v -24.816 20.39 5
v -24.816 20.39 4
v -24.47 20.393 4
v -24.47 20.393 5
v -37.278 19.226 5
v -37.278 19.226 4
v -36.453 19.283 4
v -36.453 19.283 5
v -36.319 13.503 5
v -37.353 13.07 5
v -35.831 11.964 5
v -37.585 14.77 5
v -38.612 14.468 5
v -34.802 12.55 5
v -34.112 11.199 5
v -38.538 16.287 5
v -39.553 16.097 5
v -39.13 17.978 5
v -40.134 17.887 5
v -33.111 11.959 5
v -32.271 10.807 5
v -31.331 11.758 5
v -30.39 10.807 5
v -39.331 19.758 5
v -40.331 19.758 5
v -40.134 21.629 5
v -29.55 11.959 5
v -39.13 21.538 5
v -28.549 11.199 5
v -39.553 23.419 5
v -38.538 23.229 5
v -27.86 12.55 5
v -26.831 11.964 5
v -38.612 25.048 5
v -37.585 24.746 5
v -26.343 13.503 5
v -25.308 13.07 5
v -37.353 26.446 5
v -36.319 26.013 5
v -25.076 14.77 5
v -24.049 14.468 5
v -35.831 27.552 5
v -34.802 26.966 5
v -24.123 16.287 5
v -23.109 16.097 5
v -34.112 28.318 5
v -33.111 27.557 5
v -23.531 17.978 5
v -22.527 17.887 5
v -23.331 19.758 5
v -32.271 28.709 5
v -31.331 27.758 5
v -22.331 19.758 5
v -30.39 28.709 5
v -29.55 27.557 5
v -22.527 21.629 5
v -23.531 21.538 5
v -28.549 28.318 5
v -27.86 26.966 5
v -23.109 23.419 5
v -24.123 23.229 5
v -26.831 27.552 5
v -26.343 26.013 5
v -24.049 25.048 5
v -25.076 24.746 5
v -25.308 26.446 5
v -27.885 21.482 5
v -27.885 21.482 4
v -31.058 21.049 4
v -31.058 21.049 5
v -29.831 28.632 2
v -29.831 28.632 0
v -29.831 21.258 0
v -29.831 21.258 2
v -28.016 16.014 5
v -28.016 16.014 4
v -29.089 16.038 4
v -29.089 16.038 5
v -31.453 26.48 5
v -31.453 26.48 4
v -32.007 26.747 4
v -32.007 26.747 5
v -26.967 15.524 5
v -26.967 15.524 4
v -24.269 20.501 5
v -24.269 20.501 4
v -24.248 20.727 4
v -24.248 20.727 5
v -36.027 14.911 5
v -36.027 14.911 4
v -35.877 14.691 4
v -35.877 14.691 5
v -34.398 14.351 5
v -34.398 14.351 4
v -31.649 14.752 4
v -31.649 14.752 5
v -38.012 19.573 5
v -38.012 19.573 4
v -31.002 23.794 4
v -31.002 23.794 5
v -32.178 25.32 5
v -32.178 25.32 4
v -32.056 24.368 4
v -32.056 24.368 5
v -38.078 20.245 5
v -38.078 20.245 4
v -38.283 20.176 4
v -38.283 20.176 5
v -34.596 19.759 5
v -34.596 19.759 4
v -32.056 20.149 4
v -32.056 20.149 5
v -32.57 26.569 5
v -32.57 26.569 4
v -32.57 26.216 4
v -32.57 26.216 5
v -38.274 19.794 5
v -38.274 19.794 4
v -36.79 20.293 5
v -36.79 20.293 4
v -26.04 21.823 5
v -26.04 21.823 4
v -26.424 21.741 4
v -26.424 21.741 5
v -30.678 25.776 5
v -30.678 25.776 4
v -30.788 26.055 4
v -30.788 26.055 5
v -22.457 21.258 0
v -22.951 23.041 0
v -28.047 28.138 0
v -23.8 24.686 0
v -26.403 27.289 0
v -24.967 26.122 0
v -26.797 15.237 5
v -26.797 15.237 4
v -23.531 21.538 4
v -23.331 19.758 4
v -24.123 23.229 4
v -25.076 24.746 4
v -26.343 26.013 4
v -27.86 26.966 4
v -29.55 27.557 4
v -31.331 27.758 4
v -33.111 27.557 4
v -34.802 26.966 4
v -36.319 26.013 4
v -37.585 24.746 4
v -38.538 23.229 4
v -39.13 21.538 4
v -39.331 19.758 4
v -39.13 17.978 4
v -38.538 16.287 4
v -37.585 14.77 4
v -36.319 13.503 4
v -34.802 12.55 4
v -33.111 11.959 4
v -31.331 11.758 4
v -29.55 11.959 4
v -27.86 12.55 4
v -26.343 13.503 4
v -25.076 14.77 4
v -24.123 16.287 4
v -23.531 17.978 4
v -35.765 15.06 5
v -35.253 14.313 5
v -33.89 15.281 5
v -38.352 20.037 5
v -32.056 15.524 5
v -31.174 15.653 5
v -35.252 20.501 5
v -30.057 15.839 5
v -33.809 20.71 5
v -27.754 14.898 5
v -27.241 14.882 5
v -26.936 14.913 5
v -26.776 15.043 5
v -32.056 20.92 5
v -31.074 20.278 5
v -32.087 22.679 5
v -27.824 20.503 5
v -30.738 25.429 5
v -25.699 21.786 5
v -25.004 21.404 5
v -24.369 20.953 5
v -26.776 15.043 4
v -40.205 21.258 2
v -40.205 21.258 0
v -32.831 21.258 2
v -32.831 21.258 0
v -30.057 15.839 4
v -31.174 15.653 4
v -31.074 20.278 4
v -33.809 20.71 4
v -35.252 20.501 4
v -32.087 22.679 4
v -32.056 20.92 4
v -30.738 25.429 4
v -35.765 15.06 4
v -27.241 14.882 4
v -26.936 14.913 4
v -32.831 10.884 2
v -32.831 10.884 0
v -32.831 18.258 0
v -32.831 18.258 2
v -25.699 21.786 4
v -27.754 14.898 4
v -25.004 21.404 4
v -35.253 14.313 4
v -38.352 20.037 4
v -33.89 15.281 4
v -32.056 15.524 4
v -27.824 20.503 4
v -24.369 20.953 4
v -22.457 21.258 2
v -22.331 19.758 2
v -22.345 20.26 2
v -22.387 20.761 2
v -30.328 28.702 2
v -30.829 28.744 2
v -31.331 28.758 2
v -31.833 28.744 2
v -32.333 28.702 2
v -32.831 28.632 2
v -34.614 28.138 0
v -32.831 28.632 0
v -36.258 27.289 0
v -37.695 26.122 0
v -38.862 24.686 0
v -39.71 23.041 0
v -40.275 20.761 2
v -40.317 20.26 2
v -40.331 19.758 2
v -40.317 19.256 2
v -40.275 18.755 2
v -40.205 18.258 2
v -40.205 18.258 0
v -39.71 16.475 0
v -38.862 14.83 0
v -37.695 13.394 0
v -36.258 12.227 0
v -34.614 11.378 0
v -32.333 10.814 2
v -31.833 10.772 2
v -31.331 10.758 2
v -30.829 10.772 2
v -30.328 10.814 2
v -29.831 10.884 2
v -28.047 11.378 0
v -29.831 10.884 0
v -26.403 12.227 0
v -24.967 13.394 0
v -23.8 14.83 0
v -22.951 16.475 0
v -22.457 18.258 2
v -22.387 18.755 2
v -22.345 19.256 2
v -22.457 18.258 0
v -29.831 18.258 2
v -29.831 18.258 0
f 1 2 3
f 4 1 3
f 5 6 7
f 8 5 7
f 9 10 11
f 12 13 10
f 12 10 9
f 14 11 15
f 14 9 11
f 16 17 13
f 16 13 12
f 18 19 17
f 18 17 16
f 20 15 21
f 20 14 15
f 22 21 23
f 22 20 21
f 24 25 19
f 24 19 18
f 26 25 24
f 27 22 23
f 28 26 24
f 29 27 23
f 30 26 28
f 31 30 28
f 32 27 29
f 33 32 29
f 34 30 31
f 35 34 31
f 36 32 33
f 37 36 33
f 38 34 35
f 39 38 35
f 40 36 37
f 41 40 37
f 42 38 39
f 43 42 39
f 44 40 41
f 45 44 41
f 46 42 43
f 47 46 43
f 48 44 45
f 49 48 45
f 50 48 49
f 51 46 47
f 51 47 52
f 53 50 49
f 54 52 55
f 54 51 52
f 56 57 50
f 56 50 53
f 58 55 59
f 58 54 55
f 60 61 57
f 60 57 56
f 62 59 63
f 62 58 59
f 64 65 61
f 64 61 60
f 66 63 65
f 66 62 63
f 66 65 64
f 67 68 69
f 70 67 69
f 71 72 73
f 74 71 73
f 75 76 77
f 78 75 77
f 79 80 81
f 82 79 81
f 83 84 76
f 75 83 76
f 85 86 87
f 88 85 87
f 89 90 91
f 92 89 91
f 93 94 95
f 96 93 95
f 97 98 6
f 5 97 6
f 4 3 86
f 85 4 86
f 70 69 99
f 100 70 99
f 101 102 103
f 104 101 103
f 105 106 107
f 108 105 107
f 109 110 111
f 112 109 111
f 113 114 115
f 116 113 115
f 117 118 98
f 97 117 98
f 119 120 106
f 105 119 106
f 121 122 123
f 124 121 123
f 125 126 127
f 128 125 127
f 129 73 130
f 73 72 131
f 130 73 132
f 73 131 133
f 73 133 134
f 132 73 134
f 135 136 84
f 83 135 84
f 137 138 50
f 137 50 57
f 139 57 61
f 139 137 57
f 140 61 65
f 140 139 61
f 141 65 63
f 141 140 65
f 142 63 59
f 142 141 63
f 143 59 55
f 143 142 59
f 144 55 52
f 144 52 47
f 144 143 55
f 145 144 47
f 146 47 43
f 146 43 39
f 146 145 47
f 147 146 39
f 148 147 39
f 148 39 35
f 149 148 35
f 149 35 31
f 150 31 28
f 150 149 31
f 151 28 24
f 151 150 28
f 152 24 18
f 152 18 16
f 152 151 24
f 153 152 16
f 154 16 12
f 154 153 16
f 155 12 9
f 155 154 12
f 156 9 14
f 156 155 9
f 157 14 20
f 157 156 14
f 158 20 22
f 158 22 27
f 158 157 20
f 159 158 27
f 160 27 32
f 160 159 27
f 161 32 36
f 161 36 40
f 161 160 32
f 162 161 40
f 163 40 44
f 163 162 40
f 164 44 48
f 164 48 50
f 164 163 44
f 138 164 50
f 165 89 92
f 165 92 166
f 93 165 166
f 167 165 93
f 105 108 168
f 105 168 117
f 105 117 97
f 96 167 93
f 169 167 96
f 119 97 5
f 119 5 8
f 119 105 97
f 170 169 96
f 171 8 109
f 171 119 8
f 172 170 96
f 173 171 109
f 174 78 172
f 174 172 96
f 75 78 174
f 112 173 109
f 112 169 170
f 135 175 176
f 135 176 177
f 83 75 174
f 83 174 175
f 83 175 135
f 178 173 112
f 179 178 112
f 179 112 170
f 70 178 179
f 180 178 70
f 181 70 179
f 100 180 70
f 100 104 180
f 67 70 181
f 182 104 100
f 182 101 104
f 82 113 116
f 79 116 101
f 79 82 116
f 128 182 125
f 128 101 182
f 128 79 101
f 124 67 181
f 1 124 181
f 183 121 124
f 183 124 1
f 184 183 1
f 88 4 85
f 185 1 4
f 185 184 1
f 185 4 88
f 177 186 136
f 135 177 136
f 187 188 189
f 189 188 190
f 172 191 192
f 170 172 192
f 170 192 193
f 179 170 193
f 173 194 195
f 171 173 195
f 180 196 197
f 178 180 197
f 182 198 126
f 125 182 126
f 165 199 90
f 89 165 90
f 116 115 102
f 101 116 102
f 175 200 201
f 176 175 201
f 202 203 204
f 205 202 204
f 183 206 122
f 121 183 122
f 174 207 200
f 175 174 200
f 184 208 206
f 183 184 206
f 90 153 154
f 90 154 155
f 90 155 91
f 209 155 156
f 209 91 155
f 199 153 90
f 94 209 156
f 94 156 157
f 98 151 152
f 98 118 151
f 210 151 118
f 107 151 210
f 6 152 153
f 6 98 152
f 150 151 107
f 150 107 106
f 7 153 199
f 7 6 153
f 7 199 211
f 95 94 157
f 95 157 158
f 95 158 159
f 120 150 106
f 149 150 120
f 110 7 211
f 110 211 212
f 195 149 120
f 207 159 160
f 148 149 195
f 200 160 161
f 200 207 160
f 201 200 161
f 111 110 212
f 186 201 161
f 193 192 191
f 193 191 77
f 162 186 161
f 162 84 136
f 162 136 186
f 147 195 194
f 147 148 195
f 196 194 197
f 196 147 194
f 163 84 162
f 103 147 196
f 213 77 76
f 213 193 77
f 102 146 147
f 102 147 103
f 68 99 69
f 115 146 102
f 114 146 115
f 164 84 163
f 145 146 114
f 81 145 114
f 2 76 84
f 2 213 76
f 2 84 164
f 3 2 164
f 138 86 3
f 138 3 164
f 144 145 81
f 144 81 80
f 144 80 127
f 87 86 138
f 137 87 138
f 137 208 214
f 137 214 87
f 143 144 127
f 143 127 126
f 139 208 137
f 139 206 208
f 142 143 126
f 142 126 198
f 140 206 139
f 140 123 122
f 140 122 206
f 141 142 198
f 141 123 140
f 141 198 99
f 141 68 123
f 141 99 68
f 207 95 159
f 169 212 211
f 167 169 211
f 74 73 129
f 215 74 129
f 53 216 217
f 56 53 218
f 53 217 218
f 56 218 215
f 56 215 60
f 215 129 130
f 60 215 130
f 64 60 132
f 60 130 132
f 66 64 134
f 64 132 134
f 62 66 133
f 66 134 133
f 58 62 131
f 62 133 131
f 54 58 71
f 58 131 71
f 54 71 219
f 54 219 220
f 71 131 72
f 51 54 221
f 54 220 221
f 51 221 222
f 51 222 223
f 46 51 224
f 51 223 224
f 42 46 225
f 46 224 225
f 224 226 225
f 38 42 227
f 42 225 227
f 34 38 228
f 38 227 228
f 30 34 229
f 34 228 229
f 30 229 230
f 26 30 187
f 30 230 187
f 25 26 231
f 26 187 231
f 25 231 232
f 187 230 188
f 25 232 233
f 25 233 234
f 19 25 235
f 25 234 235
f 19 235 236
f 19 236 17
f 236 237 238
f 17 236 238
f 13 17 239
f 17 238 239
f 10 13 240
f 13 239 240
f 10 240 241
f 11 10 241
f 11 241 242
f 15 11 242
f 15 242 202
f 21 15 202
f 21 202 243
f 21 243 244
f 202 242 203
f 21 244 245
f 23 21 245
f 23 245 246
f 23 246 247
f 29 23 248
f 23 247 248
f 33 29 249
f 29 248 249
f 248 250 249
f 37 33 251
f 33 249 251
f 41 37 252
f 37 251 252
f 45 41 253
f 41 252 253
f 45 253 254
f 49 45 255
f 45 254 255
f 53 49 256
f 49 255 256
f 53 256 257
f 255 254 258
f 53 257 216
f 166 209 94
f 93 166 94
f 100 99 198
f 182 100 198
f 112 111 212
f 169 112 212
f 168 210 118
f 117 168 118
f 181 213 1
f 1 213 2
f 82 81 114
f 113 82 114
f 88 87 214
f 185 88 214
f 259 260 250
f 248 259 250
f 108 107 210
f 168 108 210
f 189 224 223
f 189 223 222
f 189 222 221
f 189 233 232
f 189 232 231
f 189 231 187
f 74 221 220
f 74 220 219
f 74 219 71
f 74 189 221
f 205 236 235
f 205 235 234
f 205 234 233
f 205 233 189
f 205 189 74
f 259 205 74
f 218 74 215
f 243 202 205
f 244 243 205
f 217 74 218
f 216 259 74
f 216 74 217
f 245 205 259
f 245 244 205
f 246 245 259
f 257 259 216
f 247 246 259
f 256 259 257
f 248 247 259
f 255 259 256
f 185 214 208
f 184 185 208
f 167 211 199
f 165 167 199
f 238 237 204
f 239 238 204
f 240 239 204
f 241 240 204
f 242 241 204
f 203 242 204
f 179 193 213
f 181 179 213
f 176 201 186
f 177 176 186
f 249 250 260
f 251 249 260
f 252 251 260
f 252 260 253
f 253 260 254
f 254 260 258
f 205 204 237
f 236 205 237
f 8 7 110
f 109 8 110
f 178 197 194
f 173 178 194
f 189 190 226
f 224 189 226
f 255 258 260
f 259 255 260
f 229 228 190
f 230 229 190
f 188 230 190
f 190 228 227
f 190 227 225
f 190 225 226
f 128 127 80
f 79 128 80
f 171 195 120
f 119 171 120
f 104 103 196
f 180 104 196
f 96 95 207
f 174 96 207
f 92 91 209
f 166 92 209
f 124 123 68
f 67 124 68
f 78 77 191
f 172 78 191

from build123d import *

# Parameters (mm, degrees)
F0_R     = 9
F1_DEPTH = 4
F3_W     = 3
F3_H     = 3
F4_DEPTH = 2
F2_R     = 9
F2_R_2   = 8
F5_DEPTH = 1
F7_DEPTH = 1


# Not quite as in the source:
# - a feature names something its author has since deleted; it is built from what else it names


with BuildPart() as f1:
    # F0 (on Top) → F1 (new body)
    with BuildSketch(Plane.XY):
        with Locations((-31.3306450844, 19.7580661625)):
            Circle(F0_R)
    extrude(amount=F1_DEPTH)

    # F3 (on face) → F4 (cut)
    with BuildSketch(Plane(origin=(0, 0, 0), x_dir=(1, 0, 0), z_dir=(0, 0, -1))):
        with BuildLine():
            ThreePointArc((-32.8306450844, -28.6321858371), (-32.0832814269, -28.7265408676), (-31.3306450844, -28.7580661625))
            ThreePointArc((-31.3306450844, -28.7580661625), (-30.5780087419, -28.7265408676), (-29.8306450844, -28.6321858371))
            Line((-29.8306450844, -28.6321858371), (-29.8306450844, -21.2580661625))
            Line((-29.8306450844, -21.2580661625), (-32.8306450844, -21.2580661625))
            Line((-32.8306450844, -21.2580661625), (-32.8306450844, -28.6321858371))
        make_face()
        with BuildLine():
            ThreePointArc((-40.204764759, -18.2580661625), (-40.2991197895, -19.0054298199), (-40.3306450844, -19.7580661625))
            ThreePointArc((-40.3306450844, -19.7580661625), (-40.2991197895, -20.510702505), (-40.204764759, -21.2580661625))
            Line((-40.204764759, -21.2580661625), (-32.8306450844, -21.2580661625))
            Line((-32.8306450844, -21.2580661625), (-32.8306450844, -18.2580661625))
            Line((-32.8306450844, -18.2580661625), (-40.204764759, -18.2580661625))
        make_face()
        with Locations((-31.3306450844, -19.7580661625)):
            Rectangle(F3_W, F3_H)
        with BuildLine():
            Line((-29.8306450844, -18.2580661625), (-29.8306450844, -21.2580661625))
            Line((-29.8306450844, -21.2580661625), (-22.4565254097, -21.2580661625))
            ThreePointArc((-22.4565254097, -21.2580661625), (-22.3621703793, -20.510702505), (-22.3306450844, -19.7580661625))
            ThreePointArc((-22.3306450844, -19.7580661625), (-22.3621703793, -19.0054298199), (-22.4565254097, -18.2580661625))
            Line((-22.4565254097, -18.2580661625), (-29.8306450844, -18.2580661625))
        make_face()
        with BuildLine():
            Line((-32.8306450844, -10.8839464878), (-32.8306450844, -18.2580661625))
            Line((-32.8306450844, -18.2580661625), (-29.8306450844, -18.2580661625))
            Line((-29.8306450844, -18.2580661625), (-29.8306450844, -10.8839464878))
            ThreePointArc((-29.8306450844, -10.8839464878), (-30.5780087419, -10.7895914574), (-31.3306450844, -10.7580661625))
            ThreePointArc((-31.3306450844, -10.7580661625), (-32.0832814269, -10.7895914574), (-32.8306450844, -10.8839464878))
        make_face()
    extrude(amount=-F4_DEPTH, mode=Mode.SUBTRACT)

    # F2 (on face) → F5 (join)
    with BuildSketch(Plane.XY.offset(4)):
        with Locations((-31.3306450844, 19.7580661625)):
            Circle(F2_R)
        with Locations((-31.3306450844, 19.7580661625)):
            Circle(F2_R_2, mode=Mode.SUBTRACT)
    extrude(amount=F5_DEPTH)

    # F6 (on face) → F7 (join)
    with BuildSketch(Plane.XY.offset(4)):
        Polygon((-32.0563357805, 20.1492391588), (-32.0563357805, 15.5241883096), (-33.8901808177, 15.2807091812), (-35.7654903866, 15.0600261471), (-36.0265778437, 14.9108290182), (-35.8773882333, 14.6911827853), (-35.2526459317, 14.3130134752), (-34.3978675811, 14.3513488068), (-31.6491488168, 14.7523119557), (-27.7544977602, 14.8984009364), (-27.2406082337, 14.8818211386), (-26.9360337682, 14.9129041244), (-26.7764911822, 15.0434478529), (-26.7972422443, 15.2371920988), (-26.9670851763, 15.5241883096), (-28.0156152913, 16.0142517072), (-29.0890316438, 16.0380853546), (-30.0566626908, 15.8391533431), (-31.1736036441, 15.6526644505), (-31.0741413977, 20.2777152997), (-27.8239687071, 20.5025335092), (-24.8161924809, 20.3896206649), (-24.4701910762, 20.3927258057), (-24.2691463661, 20.5014959561), (-24.248470489, 20.7273742743), (-24.368616131, 20.9532450739), (-25.0037038896, 21.403934083), (-25.6989396543, 21.7862799203), (-26.0398284784, 21.8225190939), (-26.4241742369, 21.7406426207), (-27.8850941182, 21.4816227513), (-31.057540548, 21.0485495894), (-31.0016029024, 23.7941707314), (-30.738440339, 25.4290687202), (-30.678367518, 25.7761979), (-30.788137629, 26.0549087229), (-31.4533219461, 26.4797040154), (-32.0066084166, 26.7469867172), (-32.5702328255, 26.5687982493), (-32.5702328255, 26.2164813041), (-32.1775490497, 25.3202760143), (-32.0563357805, 24.3681330789), (-32.0874247812, 22.6793274398), (-32.0563357805, 20.9200960041), (-33.8093644531, 20.709758427), (-35.2516083786, 20.5014959561), (-36.7901718172, 20.2932635593), (-38.0780173149, 20.2445662299), (-38.2831611116, 20.1761854655), (-38.351541876, 20.0373337936), (-38.2738359152, 19.7938772208), (-38.0117086494, 19.5731716311), (-37.2781676271, 19.2260875624), (-36.4534482425, 19.2830853166), (-34.5957620394, 19.7586530447), align=None)
    extrude(amount=F7_DEPTH)


solid = f1.part
